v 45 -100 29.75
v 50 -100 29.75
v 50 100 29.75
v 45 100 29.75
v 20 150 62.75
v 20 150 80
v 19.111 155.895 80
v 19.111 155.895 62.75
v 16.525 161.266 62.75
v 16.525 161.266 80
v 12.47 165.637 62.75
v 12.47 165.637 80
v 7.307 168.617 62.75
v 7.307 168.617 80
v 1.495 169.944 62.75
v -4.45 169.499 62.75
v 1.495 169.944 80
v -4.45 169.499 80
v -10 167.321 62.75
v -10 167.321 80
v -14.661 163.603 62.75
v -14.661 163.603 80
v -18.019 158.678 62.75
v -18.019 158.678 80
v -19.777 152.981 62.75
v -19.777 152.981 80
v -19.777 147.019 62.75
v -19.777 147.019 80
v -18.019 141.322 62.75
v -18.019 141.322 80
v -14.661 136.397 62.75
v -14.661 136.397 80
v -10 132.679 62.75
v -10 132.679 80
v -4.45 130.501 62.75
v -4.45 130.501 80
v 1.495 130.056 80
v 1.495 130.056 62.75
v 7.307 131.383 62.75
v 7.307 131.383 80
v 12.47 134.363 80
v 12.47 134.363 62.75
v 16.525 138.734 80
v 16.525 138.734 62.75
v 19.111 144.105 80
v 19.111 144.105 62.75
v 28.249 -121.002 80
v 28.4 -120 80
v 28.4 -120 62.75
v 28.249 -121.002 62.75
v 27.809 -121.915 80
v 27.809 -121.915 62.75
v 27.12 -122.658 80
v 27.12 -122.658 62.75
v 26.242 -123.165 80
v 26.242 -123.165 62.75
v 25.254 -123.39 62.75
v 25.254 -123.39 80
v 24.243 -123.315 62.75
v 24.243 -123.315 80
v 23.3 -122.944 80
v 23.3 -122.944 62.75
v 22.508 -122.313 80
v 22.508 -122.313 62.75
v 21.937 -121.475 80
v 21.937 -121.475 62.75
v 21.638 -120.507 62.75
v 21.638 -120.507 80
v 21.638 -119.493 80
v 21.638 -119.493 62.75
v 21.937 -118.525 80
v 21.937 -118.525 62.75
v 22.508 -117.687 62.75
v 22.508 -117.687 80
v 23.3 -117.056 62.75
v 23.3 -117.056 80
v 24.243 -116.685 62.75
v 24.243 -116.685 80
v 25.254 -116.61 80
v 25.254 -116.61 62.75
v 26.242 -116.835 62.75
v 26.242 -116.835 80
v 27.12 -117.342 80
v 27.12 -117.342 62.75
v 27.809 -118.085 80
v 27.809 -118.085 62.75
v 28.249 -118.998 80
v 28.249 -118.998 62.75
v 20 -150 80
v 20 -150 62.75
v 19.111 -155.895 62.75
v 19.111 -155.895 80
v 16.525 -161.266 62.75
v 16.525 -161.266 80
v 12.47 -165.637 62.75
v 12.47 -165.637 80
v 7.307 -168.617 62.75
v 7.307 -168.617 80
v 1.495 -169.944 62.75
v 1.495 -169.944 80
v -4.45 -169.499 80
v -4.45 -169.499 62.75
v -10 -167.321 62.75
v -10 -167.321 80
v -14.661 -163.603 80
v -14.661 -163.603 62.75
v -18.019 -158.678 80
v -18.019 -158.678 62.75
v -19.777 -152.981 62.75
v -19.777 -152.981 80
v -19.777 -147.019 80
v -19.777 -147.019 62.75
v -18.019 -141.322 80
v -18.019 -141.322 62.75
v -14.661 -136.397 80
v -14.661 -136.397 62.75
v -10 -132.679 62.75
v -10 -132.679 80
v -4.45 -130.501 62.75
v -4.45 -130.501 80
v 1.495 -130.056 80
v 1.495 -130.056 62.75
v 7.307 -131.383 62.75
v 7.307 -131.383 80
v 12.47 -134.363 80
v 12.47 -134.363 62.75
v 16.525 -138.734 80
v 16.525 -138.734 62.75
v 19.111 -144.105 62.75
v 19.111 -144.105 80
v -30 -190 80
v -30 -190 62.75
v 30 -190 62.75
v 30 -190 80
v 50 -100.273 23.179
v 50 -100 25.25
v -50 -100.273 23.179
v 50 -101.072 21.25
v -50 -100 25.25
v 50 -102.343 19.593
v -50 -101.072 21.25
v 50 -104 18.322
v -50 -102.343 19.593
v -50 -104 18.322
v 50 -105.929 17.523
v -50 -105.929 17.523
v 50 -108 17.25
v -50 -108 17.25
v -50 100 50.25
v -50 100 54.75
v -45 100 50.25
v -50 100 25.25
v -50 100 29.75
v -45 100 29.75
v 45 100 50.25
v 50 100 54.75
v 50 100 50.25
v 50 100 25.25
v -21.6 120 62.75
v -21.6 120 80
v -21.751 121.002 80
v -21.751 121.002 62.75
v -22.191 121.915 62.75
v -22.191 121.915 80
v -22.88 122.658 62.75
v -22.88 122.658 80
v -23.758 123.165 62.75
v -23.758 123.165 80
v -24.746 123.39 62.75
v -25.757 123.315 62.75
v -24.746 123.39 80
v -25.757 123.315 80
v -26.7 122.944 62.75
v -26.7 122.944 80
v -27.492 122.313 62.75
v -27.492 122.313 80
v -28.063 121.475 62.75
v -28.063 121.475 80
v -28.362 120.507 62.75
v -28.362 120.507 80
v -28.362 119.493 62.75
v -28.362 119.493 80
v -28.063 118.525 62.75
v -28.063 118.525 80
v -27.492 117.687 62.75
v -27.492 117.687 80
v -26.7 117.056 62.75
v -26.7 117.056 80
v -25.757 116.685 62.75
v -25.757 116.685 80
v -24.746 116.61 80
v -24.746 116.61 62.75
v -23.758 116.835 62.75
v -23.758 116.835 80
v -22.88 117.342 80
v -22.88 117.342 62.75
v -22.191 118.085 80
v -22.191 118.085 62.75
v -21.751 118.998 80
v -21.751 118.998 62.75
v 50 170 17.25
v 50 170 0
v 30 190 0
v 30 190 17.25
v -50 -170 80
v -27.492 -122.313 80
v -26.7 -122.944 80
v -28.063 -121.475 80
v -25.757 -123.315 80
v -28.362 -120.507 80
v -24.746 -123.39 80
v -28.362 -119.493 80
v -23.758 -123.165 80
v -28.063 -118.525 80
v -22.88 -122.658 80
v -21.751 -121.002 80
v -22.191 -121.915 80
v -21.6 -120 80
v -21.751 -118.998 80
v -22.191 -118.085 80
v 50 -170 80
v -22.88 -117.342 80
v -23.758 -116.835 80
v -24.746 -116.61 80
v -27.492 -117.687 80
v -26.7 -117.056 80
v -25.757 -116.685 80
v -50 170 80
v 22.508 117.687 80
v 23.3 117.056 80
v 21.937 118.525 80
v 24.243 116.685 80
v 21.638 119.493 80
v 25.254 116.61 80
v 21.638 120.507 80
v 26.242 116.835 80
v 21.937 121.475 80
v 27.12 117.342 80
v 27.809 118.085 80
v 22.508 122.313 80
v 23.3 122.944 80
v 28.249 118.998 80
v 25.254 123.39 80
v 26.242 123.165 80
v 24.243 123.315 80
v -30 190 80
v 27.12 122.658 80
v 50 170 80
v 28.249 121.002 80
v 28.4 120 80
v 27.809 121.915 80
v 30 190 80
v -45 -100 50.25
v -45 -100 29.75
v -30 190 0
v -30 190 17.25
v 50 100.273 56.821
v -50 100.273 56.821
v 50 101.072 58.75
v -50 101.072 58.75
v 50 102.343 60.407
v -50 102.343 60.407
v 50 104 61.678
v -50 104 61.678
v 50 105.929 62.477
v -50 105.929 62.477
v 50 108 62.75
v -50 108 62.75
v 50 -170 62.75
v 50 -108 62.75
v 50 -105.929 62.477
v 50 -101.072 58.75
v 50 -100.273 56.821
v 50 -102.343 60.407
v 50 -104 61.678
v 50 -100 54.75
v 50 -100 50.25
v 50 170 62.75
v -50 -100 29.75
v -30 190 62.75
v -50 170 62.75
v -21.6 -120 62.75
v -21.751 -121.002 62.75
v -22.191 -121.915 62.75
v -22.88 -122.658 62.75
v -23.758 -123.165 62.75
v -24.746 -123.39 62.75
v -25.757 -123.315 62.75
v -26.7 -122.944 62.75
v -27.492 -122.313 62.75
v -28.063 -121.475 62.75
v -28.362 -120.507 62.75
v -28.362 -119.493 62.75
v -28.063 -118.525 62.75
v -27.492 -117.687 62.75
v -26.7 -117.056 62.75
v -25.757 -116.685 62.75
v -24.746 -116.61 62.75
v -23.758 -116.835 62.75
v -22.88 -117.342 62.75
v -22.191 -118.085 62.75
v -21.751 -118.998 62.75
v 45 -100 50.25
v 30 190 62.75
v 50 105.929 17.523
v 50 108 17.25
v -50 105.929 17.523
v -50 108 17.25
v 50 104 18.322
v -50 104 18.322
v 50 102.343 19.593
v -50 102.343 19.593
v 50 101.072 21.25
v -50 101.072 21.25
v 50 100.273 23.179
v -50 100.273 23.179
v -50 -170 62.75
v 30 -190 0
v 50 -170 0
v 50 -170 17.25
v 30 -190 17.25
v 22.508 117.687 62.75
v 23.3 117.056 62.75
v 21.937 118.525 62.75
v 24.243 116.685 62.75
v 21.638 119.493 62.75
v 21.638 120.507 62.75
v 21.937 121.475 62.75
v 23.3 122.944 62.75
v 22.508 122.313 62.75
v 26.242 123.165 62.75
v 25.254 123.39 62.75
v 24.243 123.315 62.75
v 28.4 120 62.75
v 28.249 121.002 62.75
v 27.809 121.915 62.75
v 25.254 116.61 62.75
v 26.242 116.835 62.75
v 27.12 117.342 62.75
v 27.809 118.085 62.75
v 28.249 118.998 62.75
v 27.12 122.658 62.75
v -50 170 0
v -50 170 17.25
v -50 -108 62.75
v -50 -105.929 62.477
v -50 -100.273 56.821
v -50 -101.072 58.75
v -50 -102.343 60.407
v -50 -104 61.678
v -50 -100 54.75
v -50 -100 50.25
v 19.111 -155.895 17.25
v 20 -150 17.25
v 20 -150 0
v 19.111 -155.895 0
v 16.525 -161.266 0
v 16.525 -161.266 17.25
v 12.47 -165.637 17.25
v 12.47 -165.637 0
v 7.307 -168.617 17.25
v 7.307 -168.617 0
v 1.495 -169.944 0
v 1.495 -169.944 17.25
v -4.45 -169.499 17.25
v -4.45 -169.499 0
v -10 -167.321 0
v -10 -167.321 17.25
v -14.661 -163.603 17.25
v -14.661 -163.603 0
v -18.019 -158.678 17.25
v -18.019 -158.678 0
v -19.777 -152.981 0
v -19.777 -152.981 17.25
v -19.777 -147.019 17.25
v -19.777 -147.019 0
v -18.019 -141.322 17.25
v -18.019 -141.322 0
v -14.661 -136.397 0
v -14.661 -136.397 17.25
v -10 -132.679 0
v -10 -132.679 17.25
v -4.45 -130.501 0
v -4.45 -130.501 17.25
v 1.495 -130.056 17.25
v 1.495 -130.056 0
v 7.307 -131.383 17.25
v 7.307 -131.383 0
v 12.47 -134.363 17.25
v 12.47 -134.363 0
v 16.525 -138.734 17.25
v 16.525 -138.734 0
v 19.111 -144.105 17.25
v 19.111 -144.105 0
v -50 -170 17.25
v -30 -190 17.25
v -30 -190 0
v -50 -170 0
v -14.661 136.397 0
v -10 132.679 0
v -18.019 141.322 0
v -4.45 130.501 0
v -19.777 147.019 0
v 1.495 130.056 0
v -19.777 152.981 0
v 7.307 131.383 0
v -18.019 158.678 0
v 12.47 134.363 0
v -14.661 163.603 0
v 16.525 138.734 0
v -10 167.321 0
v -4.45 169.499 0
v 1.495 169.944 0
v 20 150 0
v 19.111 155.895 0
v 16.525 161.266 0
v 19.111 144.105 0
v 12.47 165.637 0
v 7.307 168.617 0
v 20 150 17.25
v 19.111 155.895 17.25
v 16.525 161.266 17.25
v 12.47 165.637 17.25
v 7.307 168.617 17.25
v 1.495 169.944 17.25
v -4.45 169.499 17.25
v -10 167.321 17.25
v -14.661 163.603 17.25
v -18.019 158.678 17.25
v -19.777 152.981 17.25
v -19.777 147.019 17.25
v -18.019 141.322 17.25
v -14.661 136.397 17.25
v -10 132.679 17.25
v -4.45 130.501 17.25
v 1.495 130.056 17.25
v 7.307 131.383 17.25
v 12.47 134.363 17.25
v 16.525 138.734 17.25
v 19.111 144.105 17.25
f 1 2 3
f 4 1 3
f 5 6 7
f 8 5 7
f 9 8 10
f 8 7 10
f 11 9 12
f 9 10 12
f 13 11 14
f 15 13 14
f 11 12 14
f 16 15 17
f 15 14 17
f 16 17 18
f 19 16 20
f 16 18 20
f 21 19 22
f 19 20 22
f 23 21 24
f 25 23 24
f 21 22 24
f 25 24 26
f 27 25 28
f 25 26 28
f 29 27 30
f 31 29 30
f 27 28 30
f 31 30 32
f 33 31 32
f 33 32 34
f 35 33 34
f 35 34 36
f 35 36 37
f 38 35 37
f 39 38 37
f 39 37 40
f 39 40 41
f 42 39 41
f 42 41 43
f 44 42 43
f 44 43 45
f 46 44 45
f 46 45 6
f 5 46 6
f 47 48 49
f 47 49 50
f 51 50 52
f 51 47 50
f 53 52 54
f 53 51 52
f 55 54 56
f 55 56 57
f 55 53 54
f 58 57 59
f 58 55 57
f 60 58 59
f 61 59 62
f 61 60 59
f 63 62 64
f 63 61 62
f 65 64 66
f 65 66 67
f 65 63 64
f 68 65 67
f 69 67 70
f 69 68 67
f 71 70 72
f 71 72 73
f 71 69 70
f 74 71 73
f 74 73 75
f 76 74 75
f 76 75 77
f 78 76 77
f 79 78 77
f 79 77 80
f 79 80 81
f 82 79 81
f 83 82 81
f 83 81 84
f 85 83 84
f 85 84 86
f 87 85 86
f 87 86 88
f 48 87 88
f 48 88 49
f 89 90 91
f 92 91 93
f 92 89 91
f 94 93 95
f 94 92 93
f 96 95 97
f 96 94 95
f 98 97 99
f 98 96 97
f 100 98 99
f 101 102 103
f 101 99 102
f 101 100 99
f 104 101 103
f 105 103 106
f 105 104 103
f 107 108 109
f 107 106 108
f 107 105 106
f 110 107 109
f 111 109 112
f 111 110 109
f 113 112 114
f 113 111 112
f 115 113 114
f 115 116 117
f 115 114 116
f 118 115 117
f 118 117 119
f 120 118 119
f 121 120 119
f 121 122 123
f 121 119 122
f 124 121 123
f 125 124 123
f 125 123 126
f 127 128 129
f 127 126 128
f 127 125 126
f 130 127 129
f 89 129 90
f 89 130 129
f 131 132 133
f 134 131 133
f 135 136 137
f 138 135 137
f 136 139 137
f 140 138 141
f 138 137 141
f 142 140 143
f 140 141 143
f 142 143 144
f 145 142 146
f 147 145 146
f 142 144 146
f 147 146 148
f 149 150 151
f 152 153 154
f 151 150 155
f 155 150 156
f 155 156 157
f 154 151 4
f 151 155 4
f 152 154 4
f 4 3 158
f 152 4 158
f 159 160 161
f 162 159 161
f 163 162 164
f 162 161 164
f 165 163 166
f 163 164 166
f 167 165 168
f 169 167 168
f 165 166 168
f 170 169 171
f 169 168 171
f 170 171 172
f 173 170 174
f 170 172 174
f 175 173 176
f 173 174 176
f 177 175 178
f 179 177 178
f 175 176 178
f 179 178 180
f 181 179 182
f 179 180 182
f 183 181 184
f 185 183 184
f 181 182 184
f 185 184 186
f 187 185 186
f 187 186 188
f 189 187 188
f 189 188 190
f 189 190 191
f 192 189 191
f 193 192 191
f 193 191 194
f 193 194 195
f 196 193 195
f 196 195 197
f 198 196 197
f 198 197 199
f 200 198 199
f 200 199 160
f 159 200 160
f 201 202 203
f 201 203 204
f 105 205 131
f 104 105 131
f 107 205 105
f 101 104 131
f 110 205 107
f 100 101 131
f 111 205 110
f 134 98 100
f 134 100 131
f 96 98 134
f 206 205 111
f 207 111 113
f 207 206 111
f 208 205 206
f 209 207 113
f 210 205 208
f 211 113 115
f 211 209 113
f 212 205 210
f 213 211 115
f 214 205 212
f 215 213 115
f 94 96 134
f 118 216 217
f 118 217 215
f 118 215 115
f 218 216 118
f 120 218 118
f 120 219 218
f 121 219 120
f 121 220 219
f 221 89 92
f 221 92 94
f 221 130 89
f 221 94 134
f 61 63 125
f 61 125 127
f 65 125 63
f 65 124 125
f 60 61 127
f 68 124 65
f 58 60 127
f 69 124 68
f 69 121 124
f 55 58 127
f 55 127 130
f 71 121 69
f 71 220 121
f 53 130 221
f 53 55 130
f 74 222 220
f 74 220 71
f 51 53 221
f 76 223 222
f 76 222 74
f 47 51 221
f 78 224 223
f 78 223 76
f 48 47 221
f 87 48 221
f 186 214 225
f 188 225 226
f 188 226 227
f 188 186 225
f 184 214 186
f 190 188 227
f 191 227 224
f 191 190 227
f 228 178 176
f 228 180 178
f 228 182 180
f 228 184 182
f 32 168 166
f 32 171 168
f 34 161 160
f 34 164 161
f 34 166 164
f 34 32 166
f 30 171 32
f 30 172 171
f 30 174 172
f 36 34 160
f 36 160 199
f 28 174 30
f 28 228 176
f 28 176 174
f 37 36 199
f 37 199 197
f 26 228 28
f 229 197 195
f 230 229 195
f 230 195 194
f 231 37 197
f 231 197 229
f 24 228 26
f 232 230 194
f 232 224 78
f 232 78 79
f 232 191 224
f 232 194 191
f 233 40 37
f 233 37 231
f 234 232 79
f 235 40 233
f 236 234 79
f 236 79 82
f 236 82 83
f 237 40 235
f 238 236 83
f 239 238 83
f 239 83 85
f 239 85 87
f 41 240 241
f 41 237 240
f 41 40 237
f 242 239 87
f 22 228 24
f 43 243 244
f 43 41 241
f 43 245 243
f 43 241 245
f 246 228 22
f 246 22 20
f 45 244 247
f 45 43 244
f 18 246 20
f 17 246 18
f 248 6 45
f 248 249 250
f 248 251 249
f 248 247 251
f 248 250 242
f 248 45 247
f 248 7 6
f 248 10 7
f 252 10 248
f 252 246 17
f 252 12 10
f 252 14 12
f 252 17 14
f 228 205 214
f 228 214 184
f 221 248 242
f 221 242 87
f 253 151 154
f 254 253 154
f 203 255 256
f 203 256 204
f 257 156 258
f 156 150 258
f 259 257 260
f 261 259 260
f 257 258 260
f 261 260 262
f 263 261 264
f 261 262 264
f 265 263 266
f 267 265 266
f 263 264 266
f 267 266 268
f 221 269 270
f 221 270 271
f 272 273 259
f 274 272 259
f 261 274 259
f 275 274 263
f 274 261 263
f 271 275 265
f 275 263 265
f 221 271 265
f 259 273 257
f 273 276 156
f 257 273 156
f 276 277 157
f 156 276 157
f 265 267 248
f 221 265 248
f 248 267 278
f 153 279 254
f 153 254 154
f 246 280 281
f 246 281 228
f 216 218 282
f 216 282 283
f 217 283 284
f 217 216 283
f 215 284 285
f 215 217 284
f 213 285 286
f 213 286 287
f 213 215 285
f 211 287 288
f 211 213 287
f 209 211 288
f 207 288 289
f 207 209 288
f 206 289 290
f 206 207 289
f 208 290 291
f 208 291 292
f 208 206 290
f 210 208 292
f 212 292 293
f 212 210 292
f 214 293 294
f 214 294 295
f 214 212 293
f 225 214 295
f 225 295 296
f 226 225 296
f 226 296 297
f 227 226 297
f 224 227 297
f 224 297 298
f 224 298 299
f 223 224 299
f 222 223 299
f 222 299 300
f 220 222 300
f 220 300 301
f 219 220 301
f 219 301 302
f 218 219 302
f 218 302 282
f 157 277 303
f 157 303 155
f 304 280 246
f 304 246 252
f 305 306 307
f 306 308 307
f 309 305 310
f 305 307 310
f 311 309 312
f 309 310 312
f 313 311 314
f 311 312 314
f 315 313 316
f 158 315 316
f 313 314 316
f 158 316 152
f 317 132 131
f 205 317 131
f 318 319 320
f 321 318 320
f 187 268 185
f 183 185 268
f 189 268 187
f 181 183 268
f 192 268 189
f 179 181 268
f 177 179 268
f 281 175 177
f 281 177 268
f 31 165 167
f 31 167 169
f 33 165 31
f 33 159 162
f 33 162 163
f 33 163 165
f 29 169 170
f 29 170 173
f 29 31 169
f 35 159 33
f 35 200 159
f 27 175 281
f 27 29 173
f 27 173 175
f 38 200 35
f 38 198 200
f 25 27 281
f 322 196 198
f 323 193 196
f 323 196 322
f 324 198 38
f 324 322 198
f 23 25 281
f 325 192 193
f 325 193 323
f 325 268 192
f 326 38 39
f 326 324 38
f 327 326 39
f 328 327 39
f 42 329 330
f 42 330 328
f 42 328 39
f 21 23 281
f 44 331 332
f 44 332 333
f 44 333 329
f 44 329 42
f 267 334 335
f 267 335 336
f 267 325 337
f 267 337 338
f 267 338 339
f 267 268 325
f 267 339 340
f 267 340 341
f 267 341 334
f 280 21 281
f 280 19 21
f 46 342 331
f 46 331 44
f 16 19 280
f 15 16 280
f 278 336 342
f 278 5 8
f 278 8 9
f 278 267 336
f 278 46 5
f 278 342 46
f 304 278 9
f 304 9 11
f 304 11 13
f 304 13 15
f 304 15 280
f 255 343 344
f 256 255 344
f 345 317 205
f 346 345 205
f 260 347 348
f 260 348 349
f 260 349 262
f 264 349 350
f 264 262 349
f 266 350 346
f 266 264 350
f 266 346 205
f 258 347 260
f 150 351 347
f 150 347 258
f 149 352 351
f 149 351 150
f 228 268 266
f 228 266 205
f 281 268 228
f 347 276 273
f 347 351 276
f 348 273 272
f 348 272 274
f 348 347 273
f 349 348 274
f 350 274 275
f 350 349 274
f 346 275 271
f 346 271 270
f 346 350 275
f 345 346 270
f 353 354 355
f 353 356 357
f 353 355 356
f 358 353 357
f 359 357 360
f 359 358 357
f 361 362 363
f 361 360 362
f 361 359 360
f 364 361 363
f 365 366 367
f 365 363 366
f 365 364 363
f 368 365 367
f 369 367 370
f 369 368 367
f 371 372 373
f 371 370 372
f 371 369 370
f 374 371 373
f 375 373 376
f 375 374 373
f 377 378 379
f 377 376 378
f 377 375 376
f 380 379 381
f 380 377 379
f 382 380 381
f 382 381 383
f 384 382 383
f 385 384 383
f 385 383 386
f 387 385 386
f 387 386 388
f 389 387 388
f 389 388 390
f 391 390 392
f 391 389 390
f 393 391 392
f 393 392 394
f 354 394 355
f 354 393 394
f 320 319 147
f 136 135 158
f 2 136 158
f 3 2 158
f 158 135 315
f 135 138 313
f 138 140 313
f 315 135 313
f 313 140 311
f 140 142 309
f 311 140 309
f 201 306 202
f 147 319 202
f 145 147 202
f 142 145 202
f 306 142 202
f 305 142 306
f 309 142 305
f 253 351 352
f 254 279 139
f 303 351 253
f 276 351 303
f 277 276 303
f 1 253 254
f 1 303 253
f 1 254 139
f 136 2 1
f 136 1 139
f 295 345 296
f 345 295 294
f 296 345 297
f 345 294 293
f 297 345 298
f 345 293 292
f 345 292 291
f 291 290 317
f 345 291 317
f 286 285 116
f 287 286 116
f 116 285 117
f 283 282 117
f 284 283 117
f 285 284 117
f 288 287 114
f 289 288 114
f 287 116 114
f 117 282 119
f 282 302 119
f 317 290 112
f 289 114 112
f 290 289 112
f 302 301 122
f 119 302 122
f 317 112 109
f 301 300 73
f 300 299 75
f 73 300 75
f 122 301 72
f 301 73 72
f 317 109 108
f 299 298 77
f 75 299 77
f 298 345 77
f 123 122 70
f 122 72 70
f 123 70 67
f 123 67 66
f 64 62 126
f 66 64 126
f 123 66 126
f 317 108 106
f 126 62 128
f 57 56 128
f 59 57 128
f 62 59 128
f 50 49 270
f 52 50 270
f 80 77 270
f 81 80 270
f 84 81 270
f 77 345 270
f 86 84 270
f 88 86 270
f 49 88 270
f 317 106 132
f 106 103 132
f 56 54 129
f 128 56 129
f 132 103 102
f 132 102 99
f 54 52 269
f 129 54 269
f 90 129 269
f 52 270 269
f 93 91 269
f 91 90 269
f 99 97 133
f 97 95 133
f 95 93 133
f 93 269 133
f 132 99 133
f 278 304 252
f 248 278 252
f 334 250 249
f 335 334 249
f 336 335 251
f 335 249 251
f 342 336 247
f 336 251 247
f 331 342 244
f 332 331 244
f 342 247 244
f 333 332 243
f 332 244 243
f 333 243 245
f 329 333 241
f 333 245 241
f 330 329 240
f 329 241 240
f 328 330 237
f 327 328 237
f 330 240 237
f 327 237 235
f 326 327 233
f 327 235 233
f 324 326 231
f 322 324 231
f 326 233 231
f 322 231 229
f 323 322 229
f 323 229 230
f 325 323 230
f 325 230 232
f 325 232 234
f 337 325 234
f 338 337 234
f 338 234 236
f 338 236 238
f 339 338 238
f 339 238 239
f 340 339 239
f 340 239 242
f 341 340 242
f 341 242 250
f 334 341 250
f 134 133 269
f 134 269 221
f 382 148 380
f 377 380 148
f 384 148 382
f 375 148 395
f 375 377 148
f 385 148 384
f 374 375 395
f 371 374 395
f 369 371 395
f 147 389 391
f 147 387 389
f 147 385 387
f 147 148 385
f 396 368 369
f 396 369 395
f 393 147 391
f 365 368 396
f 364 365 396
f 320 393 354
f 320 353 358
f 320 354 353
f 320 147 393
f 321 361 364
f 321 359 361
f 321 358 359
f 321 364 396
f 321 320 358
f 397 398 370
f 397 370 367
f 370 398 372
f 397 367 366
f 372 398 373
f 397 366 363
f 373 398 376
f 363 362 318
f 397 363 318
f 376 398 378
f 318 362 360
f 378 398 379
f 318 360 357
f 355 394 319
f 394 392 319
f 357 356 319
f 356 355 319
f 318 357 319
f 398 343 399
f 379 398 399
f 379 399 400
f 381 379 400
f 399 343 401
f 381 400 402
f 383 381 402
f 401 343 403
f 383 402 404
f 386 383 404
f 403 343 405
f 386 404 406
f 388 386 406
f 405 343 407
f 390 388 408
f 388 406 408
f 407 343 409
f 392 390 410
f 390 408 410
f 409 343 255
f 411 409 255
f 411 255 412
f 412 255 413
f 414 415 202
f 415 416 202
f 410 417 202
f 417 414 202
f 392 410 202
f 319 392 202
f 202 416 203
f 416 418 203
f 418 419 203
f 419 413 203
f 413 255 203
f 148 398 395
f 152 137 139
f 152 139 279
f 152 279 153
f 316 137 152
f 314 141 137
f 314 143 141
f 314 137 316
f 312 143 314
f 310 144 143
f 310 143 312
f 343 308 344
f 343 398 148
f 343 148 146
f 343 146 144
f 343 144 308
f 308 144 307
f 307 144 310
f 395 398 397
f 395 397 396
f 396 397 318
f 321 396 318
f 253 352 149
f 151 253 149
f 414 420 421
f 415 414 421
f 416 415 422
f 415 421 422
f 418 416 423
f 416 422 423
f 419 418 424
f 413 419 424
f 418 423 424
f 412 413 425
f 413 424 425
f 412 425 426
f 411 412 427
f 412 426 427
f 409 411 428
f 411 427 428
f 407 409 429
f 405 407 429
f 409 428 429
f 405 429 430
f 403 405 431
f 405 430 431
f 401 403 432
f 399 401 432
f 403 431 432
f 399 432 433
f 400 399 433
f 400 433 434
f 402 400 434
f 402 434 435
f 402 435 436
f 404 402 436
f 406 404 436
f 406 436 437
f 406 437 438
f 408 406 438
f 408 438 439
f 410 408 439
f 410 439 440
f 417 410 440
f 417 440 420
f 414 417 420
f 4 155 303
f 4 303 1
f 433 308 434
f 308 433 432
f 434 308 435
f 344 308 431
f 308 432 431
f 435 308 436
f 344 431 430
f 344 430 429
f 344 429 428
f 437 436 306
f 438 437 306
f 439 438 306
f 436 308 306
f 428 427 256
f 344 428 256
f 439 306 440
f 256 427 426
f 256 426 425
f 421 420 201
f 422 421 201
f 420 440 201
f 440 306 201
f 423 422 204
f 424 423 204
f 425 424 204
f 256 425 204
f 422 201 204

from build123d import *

# Parameters (mm, degrees)
SKETCH_1_W              = 100
SKETCH_1_H              = 380
EXTRUDE_1_DEPTH         = 80
CUT_EXTRUDE_1_REACH     = 231.129
SKETCH_2_W              = 45.5
SKETCH_2_H              = 90
SKETCH_3_W              = 20.5
SKETCH_3_H              = 290
CUT_EXTRUDE_2_DEPTH     = 5
SKETCH_4_R              = 20
CUT_EXTRUDE_3_DEPTH     = 213.132034356
HOLE_WIZARD_M8_1_REACH  = 214.132
HOLE_WIZARD_M8_1_BORE_R = 3.4
FILLET_1_R              = 8
CHAMFER_1_SIZE          = 20


with BuildPart() as part:
    # 草图1 → 凸台-拉伸1 (new body)
    with BuildSketch(Plane.XY):
        Rectangle(SKETCH_1_W, SKETCH_1_H)
    extrude(amount=EXTRUDE_1_DEPTH)

    # 草图2 → 切除-拉伸1 (cut, up to next)
    with BuildSketch(Plane(origin=(50, 0, 0), x_dir=(0, 0, -1), z_dir=(1, 0, 0)), mode=Mode.PRIVATE) as cut_extrude_1_sk1:
        with Locations((-40, 145)):
            Rectangle(SKETCH_2_W, SKETCH_2_H)
    cut_extrude_1_tool1 = extrude(cut_extrude_1_sk1.sketch, amount=-CUT_EXTRUDE_1_REACH, mode=Mode.PRIVATE) & part.part
    cut_extrude_1 = cut_extrude_1_tool1.solids().sort_by_distance((50, 145, 40))[0]
    add(cut_extrude_1, mode=Mode.SUBTRACT)

    # 草图3 → 切除-拉伸2 (cut)
    with BuildSketch(Plane(origin=(50, 0, 0), x_dir=(0, 0, -1), z_dir=(1, 0, 0))):
        with Locations((-40, -45)):
            Rectangle(SKETCH_3_W, SKETCH_3_H)
    cut_extrude_2 = extrude(amount=-CUT_EXTRUDE_2_DEPTH, mode=Mode.SUBTRACT)

    # 镜向1: 切除-拉伸1 across plane
    add(cut_extrude_1.mirror(Plane.ZX), mode=Mode.SUBTRACT)

    # 镜向2: 切除-拉伸2 across plane
    add(cut_extrude_2.mirror(Plane(origin=(0, 0, 0), x_dir=(0, 0, 1), z_dir=(1, 0, 0))), mode=Mode.SUBTRACT)

    # 草图4 → 切除-拉伸3 (cut, through all)
    with BuildSketch(Plane.XY.offset(80)):
        with Locations((0, 150)):
            Circle(SKETCH_4_R)
    cut_extrude_3 = extrude(amount=-CUT_EXTRUDE_3_DEPTH, mode=Mode.SUBTRACT)

    # 镜向3: 切除-拉伸3 across plane
    add(cut_extrude_3.mirror(Plane.ZX), mode=Mode.SUBTRACT)

    # M8 螺纹孔1 bore → M8 螺纹孔1 (cut, up to next)
    with BuildSketch(Plane.XY.offset(80), mode=Mode.PRIVATE) as hole_wizard_m8_1_sk1:
        with Locations((-25, 120)):
            Circle(HOLE_WIZARD_M8_1_BORE_R)
    hole_wizard_m8_1_tool1 = extrude(hole_wizard_m8_1_sk1.sketch, amount=-HOLE_WIZARD_M8_1_REACH, mode=Mode.PRIVATE) & part.part
    # M8 螺纹孔1 bore → M8 螺纹孔1 (cut, up to next)
    with BuildSketch(Plane.XY.offset(80), mode=Mode.PRIVATE) as hole_wizard_m8_1_sk2:
        with Locations((25, 120)):
            Circle(HOLE_WIZARD_M8_1_BORE_R)
    hole_wizard_m8_1_tool2 = extrude(hole_wizard_m8_1_sk2.sketch, amount=-HOLE_WIZARD_M8_1_REACH, mode=Mode.PRIVATE) & part.part
    hole_wizard_m8_1_1 = hole_wizard_m8_1_tool1.solids().sort_by_distance((-25, 120, 80))[0]
    add(hole_wizard_m8_1_1, mode=Mode.SUBTRACT)
    hole_wizard_m8_1_2 = hole_wizard_m8_1_tool2.solids().sort_by_distance((25, 120, 80))[0]
    add(hole_wizard_m8_1_2, mode=Mode.SUBTRACT)
    hole_wizard_m8_1 = hole_wizard_m8_1_1 + hole_wizard_m8_1_2  # M8 螺纹孔1 as one shape, for the pattern or mirror that repeats it

    # 镜向4: M8 螺纹孔1 across plane
    add(hole_wizard_m8_1.mirror(Plane.ZX), mode=Mode.SUBTRACT)

    # 圆角1
    fillet_1_edges = [part.edges().sort_by_distance(p)[0] for p in [
        (0, 100, 17.25),
        (0, 100, 62.75),
        (0, -100, 62.75),
        (0, -100, 17.25),
    ]]
    fillet(fillet_1_edges, radius=FILLET_1_R)

    # 倒角1
    chamfer_1_edges = [part.edges().sort_by_distance(p)[0] for p in [
        (-50, 190, 8.625),
        (50, 190, 8.625),
        (50, -190, 8.625),
        (-50, -190, 8.625),
        (-50, 190, 71.375),
        (50, 190, 71.375),
        (50, -190, 71.375),
        (-50, -190, 71.375),
    ]]
    chamfer(chamfer_1_edges, length=CHAMFER_1_SIZE)


solid = part.part
